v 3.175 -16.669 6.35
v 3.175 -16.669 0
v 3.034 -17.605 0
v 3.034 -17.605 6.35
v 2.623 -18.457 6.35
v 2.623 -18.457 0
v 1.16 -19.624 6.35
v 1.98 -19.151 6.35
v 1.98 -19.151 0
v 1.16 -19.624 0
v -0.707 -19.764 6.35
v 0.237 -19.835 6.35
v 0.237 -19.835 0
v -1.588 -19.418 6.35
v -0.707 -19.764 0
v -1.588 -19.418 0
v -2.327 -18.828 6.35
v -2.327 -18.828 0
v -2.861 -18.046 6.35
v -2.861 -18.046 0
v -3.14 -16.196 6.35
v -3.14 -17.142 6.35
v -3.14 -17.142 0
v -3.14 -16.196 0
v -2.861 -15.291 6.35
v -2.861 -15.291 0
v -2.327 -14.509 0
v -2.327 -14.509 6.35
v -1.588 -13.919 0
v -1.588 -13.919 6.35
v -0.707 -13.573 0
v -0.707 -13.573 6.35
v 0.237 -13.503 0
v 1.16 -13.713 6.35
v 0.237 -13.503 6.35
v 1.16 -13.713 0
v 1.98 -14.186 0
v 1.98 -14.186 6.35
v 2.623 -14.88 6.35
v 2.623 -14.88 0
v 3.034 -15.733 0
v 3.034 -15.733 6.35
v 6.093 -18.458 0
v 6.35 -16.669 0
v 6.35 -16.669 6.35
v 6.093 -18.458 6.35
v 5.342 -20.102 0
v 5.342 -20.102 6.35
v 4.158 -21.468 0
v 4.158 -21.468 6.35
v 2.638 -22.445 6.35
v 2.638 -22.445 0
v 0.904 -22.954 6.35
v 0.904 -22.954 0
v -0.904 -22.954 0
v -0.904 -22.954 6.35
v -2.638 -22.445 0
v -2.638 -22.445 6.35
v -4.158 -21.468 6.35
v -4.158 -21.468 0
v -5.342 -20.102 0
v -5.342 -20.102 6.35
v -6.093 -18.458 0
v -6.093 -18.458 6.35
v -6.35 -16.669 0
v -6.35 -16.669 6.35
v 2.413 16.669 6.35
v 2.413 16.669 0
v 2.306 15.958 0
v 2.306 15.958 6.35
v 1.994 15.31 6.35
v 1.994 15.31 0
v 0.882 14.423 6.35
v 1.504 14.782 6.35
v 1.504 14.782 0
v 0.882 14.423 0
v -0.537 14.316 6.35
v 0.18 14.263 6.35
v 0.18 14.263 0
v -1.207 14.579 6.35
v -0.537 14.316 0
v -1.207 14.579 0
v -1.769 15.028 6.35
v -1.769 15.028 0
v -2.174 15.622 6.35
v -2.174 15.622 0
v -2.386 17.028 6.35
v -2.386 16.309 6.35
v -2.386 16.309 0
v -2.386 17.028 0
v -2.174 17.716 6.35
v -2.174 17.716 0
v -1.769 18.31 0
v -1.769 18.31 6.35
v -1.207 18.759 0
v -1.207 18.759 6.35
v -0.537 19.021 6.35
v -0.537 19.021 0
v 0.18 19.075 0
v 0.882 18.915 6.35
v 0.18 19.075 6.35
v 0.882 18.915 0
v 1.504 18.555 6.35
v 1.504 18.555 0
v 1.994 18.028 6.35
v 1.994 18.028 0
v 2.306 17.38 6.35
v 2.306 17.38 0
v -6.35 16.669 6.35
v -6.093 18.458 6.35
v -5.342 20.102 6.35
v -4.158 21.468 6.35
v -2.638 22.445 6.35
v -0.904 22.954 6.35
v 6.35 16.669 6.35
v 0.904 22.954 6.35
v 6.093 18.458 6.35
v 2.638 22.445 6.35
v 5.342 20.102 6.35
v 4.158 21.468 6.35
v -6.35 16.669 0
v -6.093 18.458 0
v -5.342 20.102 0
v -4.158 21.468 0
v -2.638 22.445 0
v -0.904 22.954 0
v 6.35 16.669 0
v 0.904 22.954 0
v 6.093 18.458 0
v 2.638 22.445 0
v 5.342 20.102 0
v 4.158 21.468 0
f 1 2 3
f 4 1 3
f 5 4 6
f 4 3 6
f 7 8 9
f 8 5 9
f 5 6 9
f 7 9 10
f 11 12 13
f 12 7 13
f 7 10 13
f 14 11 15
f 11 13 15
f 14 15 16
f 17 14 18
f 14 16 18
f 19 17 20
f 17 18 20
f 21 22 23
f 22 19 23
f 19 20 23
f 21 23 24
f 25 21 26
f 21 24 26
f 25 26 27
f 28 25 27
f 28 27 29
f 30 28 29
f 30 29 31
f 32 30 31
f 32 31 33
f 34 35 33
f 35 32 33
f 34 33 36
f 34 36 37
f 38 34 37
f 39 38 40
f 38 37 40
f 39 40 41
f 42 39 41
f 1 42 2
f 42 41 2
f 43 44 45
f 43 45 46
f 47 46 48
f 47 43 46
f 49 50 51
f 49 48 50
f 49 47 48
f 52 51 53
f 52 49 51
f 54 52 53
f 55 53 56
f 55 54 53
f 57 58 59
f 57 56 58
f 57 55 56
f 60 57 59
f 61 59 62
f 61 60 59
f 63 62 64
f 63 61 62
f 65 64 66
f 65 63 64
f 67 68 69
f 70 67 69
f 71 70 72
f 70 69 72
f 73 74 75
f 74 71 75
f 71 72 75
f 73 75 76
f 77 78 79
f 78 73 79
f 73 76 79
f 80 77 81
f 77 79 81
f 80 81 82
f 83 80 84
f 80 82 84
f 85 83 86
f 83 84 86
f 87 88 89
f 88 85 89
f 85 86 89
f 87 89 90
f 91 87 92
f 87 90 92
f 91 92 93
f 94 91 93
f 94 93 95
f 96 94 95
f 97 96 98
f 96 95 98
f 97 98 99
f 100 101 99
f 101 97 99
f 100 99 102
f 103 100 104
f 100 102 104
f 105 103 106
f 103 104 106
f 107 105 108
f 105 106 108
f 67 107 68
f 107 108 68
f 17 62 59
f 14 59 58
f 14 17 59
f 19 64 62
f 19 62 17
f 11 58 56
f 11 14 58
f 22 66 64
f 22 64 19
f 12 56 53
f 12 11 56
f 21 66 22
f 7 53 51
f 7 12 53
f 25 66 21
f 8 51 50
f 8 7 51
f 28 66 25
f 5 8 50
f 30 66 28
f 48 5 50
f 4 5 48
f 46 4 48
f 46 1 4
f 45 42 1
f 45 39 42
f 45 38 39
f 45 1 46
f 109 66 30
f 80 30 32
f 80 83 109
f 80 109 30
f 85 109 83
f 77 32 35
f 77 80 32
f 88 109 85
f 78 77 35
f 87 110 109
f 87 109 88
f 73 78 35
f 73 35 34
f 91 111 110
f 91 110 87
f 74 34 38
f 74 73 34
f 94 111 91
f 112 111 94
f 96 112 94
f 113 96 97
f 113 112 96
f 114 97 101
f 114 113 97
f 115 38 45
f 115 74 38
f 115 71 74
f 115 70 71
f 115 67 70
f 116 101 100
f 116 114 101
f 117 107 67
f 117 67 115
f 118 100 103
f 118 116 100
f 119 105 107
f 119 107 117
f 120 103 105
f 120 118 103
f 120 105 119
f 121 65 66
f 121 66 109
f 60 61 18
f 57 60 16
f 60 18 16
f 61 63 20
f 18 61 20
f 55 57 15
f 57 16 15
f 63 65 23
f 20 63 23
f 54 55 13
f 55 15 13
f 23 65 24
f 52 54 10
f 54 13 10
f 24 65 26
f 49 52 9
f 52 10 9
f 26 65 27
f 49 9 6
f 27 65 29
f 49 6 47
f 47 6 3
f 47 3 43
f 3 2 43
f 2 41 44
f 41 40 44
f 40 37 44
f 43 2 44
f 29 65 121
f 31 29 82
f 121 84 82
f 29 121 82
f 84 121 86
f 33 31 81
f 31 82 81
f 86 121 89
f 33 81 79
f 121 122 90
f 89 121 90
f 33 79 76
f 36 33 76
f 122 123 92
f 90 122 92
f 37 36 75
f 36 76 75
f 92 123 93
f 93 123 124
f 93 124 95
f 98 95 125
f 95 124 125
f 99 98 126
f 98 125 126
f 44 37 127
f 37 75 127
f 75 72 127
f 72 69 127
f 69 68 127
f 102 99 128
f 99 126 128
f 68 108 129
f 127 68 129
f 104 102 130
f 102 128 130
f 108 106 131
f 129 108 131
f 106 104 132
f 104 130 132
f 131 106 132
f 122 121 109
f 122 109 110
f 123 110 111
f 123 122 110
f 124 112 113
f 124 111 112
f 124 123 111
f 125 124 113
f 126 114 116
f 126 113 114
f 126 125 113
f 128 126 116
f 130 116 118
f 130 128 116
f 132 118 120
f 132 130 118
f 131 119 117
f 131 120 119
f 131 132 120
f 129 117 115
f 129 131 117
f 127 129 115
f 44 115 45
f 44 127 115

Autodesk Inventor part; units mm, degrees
ref_plane "YZ Plane" through (0, 0, 0) normal (1, 0, 0) x (0, 1, 0)
ref_plane "XZ Plane" through (0, 0, 0) normal (0, 1, 0) x (-1, 0, 0)
ref_plane "XY Plane" through (0, 0, 0) normal (0, 0, 1) x (1, 0, 0)
sketch "Sketch1" plane through (0, 0, 0) normal (0, 0, 1) x (1, 0, 0)
  line L0 (0, -16.6688) -> (0, 16.6688) construction
  line L1 (-6.35, -16.6688) -> (-6.35, 16.6688)
  line L2 (6.35, 16.6688) -> (6.35, -16.6687)
  arc A0 (-6.35, -16.6688) -> (6.35, -16.6687) centre (0, -16.6688) ccw
  arc A1 (6.35, 16.6688) -> (-6.35, 16.6688) centre (0, 16.6688) ccw
  circle A2 centre (0, 16.6688) radius 2.413
  circle A3 centre (0, -16.6688) radius 3.175
  point P0 (0, 0)
  dimension "d0" = 16.6687
  dimension "d1" = 4.826
  dimension "d2" = 6.35
  dimension "d3" = 6.35
extrude "Extrusion1" add sketch "Sketch1" along normal blind 6.35
properties part number "Dog Shifter Reverse Connector Plate" material "Aluminum 6061"
